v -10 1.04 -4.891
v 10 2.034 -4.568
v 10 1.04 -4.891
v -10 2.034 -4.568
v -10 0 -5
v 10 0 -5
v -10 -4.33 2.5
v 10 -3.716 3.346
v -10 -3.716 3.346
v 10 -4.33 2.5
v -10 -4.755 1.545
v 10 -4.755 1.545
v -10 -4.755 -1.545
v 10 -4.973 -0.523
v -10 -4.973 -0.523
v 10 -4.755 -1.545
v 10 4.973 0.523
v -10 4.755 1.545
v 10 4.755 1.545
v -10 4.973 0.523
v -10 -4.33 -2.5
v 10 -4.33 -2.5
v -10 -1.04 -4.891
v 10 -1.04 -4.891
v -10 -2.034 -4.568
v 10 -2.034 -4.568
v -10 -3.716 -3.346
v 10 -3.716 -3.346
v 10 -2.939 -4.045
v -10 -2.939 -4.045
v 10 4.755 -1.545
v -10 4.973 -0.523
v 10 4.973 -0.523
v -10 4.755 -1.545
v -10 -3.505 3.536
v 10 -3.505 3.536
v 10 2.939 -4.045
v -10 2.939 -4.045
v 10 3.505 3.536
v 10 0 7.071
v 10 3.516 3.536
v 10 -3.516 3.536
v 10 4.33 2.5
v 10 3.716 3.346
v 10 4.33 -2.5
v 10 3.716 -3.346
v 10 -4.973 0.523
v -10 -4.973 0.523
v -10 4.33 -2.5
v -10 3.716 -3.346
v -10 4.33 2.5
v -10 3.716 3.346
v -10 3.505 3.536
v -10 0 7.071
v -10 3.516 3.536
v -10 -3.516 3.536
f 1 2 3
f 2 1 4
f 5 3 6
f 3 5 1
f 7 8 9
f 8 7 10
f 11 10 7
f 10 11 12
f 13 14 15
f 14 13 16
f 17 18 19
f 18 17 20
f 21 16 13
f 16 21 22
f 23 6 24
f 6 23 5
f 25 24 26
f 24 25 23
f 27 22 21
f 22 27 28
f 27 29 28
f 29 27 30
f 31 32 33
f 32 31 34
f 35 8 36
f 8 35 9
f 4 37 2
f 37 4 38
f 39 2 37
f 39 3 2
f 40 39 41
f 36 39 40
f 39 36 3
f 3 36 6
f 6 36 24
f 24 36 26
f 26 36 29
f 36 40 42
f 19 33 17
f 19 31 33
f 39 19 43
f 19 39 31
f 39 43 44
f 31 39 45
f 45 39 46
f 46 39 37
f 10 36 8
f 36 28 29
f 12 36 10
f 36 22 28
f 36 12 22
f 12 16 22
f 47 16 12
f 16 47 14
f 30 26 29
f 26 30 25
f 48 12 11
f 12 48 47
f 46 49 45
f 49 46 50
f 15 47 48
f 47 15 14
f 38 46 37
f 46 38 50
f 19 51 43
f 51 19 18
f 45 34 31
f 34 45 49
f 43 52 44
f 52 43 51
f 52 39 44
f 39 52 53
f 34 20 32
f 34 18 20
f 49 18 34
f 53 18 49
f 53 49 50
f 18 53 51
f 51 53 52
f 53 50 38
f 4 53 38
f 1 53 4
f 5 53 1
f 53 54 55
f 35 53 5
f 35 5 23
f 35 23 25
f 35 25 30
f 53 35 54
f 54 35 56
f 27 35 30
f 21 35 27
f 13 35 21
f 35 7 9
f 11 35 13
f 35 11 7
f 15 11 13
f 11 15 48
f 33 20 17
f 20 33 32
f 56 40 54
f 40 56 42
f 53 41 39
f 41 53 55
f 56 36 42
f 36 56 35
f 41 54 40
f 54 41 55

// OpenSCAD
// Shelf for IKEA STUVA Loft bed
rail_thickness = 17;   // this is the bed rail where the shelf will hang

include <./MCAD/teardrop.scad>

width = 100;
length = 220;
edge_t = 4;
height = 40;

slat_w = 16;
dsw = 2;
dcw = edge_t+30;

difference() {
    cube([length,width,height]);   
    // cut out inside
    translate([edge_t,edge_t,5]) 
        #cube([length-edge_t*2,100-edge_t*2,height+2]);

    // add circle decorations for front
    translate([edge_t+15,edge_t+2,5+15]) 
        rotate([90,0,0]) 
            #cylinder(r=15,h=10);
    translate([edge_t+15+40,edge_t+2,5+15]) 
        rotate([90,0,0]) 
            #cylinder(r=15,h=10);
    translate([edge_t+15+80,edge_t+2,5+15]) 
        rotate([90,0,0]) 
            #cylinder(r=15,h=10);
    translate([edge_t+15+120,edge_t+2,5+15]) 
        rotate([90,0,0]) 
            #cylinder(r=15,h=10);    
    translate([edge_t+15+160,edge_t+2,5+15]) 
        rotate([90,0,0]) 
            #cylinder(r=15,h=10);
    
    // add slats for left side
    translate([-1,edge_t,5]) 
            cube([edge_t+2,slat_w,height-2*edge_t]);
    translate([-1,1*(slat_w+2)+edge_t,5]) 
            cube([edge_t+2,slat_w,height-2*edge_t]);
    translate([-1,2*(slat_w+2)+edge_t,5]) 
            cube([edge_t+2,slat_w,height-2*edge_t]);
    translate([-1,3*(slat_w+2)+edge_t,5]) 
            cube([edge_t+2,slat_w,height-2*edge_t]);
    translate([-1,4*(slat_w+2)+edge_t,5]) 
            cube([edge_t+2,slat_w,height-2*edge_t]);


    // add slats for right side
    translate([length-edge_t,edge_t+2,5]) 
            #cube([edge_t+2,slat_w,height-2*edge_t]);
    translate([length-edge_t,20+edge_t+2,5]) 
            #cube([edge_t+2,slat_w,height-2*edge_t]);
    translate([length-edge_t,40+edge_t+2,5]) 
            #cube([edge_t+2,slat_w,height-2*edge_t]);
    translate([length-edge_t,60+edge_t+2,5]) 
            #cube([edge_t+2,slat_w,height-2*edge_t]);
    translate([length-edge_t,80+edge_t+2,5]) 
            #cube([edge_t+2,slat_w,height-2*edge_t]);
}

module decor_teardrop() {
    teardrop(5, 20, 90);
}

!decor_teardrop();

module test_teardrop(){
    translate([0, -15, 0]) teardrop(5, 20, 90);
    translate([0, 0, 0]) teardrop(5, 20, 60);
    translate([0, 15, 0]) teardrop(5, 20, 45);
}

test_teardrop();

translate([0,width-edge_t,0]) {
    difference() {
    cube([length,rail_thickness+2*edge_t,height]);
        translate([0,edge_t,0])
    #cube([length,rail_thickness,height-edge_t]);
    }
}
